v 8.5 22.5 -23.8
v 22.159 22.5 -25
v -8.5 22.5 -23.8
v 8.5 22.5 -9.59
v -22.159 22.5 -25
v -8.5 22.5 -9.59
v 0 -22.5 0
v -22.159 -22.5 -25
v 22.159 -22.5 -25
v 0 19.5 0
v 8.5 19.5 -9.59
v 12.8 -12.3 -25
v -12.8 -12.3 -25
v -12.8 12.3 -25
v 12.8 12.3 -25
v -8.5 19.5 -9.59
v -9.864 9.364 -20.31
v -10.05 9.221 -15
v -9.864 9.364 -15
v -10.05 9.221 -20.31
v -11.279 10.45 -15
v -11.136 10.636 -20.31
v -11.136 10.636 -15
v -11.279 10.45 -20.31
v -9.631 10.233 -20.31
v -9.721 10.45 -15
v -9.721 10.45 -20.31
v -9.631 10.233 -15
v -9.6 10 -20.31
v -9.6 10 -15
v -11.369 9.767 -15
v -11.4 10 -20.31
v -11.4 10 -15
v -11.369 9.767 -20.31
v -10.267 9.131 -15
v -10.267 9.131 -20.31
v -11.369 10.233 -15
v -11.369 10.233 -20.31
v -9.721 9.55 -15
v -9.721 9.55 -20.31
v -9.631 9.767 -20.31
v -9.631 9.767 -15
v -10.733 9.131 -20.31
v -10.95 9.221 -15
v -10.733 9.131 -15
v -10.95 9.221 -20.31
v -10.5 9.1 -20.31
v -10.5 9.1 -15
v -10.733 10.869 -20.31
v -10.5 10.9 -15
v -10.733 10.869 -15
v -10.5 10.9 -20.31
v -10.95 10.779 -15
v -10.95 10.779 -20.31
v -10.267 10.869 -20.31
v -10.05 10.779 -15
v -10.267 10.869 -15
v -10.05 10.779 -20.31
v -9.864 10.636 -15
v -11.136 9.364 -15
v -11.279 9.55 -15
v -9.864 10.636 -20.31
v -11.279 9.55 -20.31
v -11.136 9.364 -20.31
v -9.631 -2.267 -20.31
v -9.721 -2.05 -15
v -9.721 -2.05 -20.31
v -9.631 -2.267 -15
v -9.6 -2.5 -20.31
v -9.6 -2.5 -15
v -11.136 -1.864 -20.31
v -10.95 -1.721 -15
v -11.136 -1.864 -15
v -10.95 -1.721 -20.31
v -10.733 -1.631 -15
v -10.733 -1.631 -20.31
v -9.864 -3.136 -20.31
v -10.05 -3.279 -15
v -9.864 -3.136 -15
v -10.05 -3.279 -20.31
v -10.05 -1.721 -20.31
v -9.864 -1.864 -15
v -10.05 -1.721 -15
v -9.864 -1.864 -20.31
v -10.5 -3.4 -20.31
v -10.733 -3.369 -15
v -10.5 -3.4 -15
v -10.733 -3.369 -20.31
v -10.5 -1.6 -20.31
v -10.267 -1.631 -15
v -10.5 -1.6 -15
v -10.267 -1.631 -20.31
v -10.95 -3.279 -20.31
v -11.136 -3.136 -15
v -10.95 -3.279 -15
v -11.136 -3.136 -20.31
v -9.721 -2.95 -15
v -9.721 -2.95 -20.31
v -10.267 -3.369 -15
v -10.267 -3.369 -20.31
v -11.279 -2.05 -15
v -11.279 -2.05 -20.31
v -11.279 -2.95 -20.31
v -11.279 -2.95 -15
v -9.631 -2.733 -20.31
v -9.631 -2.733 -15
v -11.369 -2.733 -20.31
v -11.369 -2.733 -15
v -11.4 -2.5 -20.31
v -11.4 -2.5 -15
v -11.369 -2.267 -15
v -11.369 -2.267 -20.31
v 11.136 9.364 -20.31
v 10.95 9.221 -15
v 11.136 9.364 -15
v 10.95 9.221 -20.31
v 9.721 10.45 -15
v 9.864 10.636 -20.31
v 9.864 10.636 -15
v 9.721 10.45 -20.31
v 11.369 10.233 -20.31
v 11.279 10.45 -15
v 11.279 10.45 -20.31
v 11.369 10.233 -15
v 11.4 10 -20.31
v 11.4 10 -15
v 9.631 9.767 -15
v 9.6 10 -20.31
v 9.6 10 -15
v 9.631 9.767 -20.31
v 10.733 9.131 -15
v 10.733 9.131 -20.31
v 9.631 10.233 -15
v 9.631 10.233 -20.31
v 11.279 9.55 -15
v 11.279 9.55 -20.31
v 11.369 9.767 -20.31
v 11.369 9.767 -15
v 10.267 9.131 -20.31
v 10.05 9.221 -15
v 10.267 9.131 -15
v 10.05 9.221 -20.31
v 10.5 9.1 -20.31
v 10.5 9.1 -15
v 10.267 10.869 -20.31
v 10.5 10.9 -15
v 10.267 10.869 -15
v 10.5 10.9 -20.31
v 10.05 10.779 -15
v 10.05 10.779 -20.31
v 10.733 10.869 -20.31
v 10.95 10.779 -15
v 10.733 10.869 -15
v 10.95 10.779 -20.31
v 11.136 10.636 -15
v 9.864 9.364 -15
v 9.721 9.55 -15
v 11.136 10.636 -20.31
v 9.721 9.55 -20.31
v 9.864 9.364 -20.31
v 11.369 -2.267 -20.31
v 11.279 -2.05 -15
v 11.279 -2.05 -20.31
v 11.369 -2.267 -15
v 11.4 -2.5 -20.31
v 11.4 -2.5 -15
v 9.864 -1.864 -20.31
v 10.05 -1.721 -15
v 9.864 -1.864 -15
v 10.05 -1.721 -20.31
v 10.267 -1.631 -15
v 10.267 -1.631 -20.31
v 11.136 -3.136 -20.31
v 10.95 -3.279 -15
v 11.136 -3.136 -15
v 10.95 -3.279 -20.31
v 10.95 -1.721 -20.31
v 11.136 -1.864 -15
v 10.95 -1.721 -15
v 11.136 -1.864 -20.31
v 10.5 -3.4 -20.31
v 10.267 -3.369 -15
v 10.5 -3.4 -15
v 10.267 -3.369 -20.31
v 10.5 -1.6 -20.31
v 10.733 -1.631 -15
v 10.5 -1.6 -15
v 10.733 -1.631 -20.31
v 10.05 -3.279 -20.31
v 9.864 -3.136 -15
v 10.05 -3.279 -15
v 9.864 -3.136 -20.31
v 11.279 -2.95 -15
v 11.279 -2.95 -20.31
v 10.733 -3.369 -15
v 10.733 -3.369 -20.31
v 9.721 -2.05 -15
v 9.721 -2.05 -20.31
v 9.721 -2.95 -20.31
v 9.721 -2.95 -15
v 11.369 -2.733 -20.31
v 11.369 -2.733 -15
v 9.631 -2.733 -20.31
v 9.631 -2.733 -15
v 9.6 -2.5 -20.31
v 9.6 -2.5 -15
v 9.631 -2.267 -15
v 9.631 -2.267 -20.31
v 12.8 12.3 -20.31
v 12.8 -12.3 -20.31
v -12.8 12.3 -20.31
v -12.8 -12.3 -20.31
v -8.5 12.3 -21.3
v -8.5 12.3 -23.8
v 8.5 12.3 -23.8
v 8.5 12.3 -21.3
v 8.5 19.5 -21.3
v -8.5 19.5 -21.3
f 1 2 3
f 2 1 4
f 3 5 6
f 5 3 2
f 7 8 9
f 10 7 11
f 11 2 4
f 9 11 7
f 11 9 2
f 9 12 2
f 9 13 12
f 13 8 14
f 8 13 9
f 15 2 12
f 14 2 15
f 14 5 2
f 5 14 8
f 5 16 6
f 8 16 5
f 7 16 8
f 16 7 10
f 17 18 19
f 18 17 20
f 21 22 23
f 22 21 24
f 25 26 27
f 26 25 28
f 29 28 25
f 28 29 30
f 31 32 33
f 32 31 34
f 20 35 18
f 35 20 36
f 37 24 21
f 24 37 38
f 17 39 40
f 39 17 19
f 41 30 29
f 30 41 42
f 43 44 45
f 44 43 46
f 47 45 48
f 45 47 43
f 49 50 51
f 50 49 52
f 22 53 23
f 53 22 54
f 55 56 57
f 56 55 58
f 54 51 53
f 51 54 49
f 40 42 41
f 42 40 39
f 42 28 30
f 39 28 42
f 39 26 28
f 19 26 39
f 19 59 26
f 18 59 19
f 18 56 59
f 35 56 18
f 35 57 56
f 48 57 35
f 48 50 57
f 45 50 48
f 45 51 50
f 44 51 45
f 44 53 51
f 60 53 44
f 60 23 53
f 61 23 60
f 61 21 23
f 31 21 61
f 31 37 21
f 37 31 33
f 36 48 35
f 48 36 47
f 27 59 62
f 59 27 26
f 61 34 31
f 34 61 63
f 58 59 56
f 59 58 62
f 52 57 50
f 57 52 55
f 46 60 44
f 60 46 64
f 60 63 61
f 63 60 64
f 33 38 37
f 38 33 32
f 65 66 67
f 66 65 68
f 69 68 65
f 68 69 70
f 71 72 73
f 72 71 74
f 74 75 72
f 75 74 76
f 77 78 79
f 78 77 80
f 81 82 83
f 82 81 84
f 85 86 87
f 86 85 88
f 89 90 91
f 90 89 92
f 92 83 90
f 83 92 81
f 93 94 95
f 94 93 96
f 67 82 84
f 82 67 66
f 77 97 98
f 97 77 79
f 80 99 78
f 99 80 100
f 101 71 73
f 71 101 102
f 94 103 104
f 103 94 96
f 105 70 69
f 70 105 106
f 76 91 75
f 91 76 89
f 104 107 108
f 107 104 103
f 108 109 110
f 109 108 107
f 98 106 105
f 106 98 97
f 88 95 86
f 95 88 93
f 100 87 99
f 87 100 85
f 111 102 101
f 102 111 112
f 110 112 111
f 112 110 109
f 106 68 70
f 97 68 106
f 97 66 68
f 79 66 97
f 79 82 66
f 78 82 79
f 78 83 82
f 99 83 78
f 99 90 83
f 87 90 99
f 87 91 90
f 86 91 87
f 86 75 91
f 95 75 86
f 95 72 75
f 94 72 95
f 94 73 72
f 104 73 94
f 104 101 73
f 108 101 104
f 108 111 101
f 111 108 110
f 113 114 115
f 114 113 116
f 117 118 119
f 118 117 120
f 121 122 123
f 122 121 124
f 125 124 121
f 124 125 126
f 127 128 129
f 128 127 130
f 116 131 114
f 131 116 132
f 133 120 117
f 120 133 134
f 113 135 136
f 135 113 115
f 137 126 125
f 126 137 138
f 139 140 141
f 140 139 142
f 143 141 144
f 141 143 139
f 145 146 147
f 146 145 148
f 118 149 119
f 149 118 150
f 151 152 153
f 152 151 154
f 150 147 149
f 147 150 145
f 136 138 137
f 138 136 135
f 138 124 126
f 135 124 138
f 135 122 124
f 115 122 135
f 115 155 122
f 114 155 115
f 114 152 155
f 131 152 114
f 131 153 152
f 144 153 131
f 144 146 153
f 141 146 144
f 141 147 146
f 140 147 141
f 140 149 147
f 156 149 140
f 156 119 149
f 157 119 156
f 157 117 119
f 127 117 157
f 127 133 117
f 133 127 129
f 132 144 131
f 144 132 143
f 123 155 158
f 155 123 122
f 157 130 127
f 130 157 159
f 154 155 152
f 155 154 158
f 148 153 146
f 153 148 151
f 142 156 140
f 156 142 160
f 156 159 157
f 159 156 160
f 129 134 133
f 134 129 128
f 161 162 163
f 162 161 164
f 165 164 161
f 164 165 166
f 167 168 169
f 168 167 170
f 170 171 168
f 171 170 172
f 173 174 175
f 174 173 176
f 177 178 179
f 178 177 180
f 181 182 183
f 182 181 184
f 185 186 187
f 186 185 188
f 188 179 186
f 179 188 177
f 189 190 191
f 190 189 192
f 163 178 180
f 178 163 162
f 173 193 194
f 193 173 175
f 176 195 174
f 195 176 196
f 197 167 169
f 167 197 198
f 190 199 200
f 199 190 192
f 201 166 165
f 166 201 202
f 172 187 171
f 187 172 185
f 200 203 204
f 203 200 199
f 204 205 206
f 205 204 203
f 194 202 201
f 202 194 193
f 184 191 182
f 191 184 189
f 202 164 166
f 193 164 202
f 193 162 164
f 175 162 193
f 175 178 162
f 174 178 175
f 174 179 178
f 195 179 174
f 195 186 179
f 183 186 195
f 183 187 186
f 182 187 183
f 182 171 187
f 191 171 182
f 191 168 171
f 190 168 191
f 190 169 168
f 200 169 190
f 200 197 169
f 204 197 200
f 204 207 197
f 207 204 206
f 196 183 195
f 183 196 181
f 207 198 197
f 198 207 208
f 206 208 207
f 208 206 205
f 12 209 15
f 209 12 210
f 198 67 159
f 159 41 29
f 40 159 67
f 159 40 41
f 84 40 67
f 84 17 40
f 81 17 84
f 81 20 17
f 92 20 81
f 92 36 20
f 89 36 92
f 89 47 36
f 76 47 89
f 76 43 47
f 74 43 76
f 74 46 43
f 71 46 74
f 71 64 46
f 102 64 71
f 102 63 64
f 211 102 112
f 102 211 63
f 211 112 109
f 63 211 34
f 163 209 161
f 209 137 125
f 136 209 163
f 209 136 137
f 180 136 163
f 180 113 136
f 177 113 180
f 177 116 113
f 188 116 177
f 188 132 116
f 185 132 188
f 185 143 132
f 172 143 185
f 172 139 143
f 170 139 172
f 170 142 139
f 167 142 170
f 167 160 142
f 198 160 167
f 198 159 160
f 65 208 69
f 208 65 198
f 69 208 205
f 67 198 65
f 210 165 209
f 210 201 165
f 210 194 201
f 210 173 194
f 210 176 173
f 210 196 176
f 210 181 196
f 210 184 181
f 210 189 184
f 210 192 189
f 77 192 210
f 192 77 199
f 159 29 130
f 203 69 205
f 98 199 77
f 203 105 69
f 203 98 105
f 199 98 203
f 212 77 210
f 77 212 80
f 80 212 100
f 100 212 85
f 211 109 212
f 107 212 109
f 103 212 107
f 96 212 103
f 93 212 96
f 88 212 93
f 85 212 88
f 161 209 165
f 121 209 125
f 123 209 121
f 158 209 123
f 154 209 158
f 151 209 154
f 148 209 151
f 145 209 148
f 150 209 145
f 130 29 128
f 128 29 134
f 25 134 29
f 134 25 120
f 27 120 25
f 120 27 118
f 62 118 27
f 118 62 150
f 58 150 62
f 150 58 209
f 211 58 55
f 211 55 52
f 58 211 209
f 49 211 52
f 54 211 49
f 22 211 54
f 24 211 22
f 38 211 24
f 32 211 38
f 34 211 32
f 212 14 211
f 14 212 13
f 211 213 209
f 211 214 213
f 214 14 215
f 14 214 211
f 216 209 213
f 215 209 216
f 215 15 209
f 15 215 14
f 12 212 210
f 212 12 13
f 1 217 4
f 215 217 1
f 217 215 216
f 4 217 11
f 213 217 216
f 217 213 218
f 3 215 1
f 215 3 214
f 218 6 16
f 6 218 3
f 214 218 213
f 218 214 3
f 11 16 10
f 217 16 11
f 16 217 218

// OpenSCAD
// Orchard Sentinel: camera mount that sits in the delta trap's roof apex.
// A wedge that fills the top of the "V", with a pocket for the Camera Module 3 Wide
// (lens facing straight down, out of the open pocket) and a channel for the ribbon cable,
// which leaves through a slot in the roof. The roof itself keeps rain off the camera.
//
// Set to the Alpha Scents red plastic delta trap (hardware/TRAP.md). Its 110 mm peak is too low
// for this inside mount to see the whole card (lens 85 mm up sees ~113 mm of the 174 mm across);
// the lens needs to sit ~131-150 mm up, above the roof peak. Redesign as a roof housing before printing.
// Camera numbers follow the Raspberry Pi Camera Module 3 board (25 x 24 mm, M2 holes
// on a 21 x 12.5 mm pattern). Check them against the official mechanical drawing
// before printing.
// Not yet test-printed.

/* [Trap] */
floor_w = 195;      // mm, inside floor width
apex    = 110;      // mm, floor to inside apex
/* [Mount] */
mount_len   = 45;   // mm along the trap
drop        = 25;   // mm from the apex down to the camera face (matches --cam-drop); face must be >= 26 mm wide
wall        = 2.4;
/* [Camera Module 3] */
board_w = 25; board_h = 24; board_t = 1.2;
hole_dx = 21; hole_dy = 12.5; hole_d = 2.2; hole_top = 2;   // hole row 2 mm from the board's top edge
back_clear = 3.5;   // room for the connector/components on the back of the board

half = atan((floor_w / 2) / apex);          // roof panel angle from vertical
w_at_face = 2 * drop * tan(half);          // wedge width at the camera face

module wedge() {
    // Triangular prism matching the apex "V" down to the camera face, extruded along the trap.
    rotate([90, 0, 0]) linear_extrude(height = mount_len, center = true)
        polygon([[0, 0], [-w_at_face / 2, -drop], [w_at_face / 2, -drop]]);
}

module camera_pocket() {
    // Board pocket open to the bottom (lens points down), screw holes for M2 self-tappers
    // driven up through the board, and a channel that carries the ribbon to the apex slot.
    translate([0, 0, -drop]) {
        translate([-board_w / 2 - 0.3, -board_h / 2 - 0.3, -0.01]) cube([board_w + 0.6, board_h + 0.6, board_t + back_clear]);
        for (sx = [-1, 1], sy = [0, 1])
            translate([sx * hole_dx / 2, board_h / 2 - hole_top - sy * hole_dy, 0]) cylinder(d = hole_d - 0.4, h = 10, $fn = 24);
        // ribbon: along the pocket's back face to the end of the mount, then straight up to the apex
        translate([-8.5, board_h / 2 - 1, board_t]) cube([17, mount_len, 2.5]);
        translate([-8.5, mount_len / 2 - 3, board_t]) cube([17, 3, drop]);
    }
}

difference() {
    intersection() {
        wedge();
        // keep a solid shell even if the trap is very steep
        translate([-100, -mount_len / 2, -drop]) cube([200, mount_len, drop]);
    }
    camera_pocket();
}

echo(str("Roof half-angle ", half, " deg; wedge face ", w_at_face, " mm wide. The camera face must be >= 26 mm wide: increase drop if not."));
